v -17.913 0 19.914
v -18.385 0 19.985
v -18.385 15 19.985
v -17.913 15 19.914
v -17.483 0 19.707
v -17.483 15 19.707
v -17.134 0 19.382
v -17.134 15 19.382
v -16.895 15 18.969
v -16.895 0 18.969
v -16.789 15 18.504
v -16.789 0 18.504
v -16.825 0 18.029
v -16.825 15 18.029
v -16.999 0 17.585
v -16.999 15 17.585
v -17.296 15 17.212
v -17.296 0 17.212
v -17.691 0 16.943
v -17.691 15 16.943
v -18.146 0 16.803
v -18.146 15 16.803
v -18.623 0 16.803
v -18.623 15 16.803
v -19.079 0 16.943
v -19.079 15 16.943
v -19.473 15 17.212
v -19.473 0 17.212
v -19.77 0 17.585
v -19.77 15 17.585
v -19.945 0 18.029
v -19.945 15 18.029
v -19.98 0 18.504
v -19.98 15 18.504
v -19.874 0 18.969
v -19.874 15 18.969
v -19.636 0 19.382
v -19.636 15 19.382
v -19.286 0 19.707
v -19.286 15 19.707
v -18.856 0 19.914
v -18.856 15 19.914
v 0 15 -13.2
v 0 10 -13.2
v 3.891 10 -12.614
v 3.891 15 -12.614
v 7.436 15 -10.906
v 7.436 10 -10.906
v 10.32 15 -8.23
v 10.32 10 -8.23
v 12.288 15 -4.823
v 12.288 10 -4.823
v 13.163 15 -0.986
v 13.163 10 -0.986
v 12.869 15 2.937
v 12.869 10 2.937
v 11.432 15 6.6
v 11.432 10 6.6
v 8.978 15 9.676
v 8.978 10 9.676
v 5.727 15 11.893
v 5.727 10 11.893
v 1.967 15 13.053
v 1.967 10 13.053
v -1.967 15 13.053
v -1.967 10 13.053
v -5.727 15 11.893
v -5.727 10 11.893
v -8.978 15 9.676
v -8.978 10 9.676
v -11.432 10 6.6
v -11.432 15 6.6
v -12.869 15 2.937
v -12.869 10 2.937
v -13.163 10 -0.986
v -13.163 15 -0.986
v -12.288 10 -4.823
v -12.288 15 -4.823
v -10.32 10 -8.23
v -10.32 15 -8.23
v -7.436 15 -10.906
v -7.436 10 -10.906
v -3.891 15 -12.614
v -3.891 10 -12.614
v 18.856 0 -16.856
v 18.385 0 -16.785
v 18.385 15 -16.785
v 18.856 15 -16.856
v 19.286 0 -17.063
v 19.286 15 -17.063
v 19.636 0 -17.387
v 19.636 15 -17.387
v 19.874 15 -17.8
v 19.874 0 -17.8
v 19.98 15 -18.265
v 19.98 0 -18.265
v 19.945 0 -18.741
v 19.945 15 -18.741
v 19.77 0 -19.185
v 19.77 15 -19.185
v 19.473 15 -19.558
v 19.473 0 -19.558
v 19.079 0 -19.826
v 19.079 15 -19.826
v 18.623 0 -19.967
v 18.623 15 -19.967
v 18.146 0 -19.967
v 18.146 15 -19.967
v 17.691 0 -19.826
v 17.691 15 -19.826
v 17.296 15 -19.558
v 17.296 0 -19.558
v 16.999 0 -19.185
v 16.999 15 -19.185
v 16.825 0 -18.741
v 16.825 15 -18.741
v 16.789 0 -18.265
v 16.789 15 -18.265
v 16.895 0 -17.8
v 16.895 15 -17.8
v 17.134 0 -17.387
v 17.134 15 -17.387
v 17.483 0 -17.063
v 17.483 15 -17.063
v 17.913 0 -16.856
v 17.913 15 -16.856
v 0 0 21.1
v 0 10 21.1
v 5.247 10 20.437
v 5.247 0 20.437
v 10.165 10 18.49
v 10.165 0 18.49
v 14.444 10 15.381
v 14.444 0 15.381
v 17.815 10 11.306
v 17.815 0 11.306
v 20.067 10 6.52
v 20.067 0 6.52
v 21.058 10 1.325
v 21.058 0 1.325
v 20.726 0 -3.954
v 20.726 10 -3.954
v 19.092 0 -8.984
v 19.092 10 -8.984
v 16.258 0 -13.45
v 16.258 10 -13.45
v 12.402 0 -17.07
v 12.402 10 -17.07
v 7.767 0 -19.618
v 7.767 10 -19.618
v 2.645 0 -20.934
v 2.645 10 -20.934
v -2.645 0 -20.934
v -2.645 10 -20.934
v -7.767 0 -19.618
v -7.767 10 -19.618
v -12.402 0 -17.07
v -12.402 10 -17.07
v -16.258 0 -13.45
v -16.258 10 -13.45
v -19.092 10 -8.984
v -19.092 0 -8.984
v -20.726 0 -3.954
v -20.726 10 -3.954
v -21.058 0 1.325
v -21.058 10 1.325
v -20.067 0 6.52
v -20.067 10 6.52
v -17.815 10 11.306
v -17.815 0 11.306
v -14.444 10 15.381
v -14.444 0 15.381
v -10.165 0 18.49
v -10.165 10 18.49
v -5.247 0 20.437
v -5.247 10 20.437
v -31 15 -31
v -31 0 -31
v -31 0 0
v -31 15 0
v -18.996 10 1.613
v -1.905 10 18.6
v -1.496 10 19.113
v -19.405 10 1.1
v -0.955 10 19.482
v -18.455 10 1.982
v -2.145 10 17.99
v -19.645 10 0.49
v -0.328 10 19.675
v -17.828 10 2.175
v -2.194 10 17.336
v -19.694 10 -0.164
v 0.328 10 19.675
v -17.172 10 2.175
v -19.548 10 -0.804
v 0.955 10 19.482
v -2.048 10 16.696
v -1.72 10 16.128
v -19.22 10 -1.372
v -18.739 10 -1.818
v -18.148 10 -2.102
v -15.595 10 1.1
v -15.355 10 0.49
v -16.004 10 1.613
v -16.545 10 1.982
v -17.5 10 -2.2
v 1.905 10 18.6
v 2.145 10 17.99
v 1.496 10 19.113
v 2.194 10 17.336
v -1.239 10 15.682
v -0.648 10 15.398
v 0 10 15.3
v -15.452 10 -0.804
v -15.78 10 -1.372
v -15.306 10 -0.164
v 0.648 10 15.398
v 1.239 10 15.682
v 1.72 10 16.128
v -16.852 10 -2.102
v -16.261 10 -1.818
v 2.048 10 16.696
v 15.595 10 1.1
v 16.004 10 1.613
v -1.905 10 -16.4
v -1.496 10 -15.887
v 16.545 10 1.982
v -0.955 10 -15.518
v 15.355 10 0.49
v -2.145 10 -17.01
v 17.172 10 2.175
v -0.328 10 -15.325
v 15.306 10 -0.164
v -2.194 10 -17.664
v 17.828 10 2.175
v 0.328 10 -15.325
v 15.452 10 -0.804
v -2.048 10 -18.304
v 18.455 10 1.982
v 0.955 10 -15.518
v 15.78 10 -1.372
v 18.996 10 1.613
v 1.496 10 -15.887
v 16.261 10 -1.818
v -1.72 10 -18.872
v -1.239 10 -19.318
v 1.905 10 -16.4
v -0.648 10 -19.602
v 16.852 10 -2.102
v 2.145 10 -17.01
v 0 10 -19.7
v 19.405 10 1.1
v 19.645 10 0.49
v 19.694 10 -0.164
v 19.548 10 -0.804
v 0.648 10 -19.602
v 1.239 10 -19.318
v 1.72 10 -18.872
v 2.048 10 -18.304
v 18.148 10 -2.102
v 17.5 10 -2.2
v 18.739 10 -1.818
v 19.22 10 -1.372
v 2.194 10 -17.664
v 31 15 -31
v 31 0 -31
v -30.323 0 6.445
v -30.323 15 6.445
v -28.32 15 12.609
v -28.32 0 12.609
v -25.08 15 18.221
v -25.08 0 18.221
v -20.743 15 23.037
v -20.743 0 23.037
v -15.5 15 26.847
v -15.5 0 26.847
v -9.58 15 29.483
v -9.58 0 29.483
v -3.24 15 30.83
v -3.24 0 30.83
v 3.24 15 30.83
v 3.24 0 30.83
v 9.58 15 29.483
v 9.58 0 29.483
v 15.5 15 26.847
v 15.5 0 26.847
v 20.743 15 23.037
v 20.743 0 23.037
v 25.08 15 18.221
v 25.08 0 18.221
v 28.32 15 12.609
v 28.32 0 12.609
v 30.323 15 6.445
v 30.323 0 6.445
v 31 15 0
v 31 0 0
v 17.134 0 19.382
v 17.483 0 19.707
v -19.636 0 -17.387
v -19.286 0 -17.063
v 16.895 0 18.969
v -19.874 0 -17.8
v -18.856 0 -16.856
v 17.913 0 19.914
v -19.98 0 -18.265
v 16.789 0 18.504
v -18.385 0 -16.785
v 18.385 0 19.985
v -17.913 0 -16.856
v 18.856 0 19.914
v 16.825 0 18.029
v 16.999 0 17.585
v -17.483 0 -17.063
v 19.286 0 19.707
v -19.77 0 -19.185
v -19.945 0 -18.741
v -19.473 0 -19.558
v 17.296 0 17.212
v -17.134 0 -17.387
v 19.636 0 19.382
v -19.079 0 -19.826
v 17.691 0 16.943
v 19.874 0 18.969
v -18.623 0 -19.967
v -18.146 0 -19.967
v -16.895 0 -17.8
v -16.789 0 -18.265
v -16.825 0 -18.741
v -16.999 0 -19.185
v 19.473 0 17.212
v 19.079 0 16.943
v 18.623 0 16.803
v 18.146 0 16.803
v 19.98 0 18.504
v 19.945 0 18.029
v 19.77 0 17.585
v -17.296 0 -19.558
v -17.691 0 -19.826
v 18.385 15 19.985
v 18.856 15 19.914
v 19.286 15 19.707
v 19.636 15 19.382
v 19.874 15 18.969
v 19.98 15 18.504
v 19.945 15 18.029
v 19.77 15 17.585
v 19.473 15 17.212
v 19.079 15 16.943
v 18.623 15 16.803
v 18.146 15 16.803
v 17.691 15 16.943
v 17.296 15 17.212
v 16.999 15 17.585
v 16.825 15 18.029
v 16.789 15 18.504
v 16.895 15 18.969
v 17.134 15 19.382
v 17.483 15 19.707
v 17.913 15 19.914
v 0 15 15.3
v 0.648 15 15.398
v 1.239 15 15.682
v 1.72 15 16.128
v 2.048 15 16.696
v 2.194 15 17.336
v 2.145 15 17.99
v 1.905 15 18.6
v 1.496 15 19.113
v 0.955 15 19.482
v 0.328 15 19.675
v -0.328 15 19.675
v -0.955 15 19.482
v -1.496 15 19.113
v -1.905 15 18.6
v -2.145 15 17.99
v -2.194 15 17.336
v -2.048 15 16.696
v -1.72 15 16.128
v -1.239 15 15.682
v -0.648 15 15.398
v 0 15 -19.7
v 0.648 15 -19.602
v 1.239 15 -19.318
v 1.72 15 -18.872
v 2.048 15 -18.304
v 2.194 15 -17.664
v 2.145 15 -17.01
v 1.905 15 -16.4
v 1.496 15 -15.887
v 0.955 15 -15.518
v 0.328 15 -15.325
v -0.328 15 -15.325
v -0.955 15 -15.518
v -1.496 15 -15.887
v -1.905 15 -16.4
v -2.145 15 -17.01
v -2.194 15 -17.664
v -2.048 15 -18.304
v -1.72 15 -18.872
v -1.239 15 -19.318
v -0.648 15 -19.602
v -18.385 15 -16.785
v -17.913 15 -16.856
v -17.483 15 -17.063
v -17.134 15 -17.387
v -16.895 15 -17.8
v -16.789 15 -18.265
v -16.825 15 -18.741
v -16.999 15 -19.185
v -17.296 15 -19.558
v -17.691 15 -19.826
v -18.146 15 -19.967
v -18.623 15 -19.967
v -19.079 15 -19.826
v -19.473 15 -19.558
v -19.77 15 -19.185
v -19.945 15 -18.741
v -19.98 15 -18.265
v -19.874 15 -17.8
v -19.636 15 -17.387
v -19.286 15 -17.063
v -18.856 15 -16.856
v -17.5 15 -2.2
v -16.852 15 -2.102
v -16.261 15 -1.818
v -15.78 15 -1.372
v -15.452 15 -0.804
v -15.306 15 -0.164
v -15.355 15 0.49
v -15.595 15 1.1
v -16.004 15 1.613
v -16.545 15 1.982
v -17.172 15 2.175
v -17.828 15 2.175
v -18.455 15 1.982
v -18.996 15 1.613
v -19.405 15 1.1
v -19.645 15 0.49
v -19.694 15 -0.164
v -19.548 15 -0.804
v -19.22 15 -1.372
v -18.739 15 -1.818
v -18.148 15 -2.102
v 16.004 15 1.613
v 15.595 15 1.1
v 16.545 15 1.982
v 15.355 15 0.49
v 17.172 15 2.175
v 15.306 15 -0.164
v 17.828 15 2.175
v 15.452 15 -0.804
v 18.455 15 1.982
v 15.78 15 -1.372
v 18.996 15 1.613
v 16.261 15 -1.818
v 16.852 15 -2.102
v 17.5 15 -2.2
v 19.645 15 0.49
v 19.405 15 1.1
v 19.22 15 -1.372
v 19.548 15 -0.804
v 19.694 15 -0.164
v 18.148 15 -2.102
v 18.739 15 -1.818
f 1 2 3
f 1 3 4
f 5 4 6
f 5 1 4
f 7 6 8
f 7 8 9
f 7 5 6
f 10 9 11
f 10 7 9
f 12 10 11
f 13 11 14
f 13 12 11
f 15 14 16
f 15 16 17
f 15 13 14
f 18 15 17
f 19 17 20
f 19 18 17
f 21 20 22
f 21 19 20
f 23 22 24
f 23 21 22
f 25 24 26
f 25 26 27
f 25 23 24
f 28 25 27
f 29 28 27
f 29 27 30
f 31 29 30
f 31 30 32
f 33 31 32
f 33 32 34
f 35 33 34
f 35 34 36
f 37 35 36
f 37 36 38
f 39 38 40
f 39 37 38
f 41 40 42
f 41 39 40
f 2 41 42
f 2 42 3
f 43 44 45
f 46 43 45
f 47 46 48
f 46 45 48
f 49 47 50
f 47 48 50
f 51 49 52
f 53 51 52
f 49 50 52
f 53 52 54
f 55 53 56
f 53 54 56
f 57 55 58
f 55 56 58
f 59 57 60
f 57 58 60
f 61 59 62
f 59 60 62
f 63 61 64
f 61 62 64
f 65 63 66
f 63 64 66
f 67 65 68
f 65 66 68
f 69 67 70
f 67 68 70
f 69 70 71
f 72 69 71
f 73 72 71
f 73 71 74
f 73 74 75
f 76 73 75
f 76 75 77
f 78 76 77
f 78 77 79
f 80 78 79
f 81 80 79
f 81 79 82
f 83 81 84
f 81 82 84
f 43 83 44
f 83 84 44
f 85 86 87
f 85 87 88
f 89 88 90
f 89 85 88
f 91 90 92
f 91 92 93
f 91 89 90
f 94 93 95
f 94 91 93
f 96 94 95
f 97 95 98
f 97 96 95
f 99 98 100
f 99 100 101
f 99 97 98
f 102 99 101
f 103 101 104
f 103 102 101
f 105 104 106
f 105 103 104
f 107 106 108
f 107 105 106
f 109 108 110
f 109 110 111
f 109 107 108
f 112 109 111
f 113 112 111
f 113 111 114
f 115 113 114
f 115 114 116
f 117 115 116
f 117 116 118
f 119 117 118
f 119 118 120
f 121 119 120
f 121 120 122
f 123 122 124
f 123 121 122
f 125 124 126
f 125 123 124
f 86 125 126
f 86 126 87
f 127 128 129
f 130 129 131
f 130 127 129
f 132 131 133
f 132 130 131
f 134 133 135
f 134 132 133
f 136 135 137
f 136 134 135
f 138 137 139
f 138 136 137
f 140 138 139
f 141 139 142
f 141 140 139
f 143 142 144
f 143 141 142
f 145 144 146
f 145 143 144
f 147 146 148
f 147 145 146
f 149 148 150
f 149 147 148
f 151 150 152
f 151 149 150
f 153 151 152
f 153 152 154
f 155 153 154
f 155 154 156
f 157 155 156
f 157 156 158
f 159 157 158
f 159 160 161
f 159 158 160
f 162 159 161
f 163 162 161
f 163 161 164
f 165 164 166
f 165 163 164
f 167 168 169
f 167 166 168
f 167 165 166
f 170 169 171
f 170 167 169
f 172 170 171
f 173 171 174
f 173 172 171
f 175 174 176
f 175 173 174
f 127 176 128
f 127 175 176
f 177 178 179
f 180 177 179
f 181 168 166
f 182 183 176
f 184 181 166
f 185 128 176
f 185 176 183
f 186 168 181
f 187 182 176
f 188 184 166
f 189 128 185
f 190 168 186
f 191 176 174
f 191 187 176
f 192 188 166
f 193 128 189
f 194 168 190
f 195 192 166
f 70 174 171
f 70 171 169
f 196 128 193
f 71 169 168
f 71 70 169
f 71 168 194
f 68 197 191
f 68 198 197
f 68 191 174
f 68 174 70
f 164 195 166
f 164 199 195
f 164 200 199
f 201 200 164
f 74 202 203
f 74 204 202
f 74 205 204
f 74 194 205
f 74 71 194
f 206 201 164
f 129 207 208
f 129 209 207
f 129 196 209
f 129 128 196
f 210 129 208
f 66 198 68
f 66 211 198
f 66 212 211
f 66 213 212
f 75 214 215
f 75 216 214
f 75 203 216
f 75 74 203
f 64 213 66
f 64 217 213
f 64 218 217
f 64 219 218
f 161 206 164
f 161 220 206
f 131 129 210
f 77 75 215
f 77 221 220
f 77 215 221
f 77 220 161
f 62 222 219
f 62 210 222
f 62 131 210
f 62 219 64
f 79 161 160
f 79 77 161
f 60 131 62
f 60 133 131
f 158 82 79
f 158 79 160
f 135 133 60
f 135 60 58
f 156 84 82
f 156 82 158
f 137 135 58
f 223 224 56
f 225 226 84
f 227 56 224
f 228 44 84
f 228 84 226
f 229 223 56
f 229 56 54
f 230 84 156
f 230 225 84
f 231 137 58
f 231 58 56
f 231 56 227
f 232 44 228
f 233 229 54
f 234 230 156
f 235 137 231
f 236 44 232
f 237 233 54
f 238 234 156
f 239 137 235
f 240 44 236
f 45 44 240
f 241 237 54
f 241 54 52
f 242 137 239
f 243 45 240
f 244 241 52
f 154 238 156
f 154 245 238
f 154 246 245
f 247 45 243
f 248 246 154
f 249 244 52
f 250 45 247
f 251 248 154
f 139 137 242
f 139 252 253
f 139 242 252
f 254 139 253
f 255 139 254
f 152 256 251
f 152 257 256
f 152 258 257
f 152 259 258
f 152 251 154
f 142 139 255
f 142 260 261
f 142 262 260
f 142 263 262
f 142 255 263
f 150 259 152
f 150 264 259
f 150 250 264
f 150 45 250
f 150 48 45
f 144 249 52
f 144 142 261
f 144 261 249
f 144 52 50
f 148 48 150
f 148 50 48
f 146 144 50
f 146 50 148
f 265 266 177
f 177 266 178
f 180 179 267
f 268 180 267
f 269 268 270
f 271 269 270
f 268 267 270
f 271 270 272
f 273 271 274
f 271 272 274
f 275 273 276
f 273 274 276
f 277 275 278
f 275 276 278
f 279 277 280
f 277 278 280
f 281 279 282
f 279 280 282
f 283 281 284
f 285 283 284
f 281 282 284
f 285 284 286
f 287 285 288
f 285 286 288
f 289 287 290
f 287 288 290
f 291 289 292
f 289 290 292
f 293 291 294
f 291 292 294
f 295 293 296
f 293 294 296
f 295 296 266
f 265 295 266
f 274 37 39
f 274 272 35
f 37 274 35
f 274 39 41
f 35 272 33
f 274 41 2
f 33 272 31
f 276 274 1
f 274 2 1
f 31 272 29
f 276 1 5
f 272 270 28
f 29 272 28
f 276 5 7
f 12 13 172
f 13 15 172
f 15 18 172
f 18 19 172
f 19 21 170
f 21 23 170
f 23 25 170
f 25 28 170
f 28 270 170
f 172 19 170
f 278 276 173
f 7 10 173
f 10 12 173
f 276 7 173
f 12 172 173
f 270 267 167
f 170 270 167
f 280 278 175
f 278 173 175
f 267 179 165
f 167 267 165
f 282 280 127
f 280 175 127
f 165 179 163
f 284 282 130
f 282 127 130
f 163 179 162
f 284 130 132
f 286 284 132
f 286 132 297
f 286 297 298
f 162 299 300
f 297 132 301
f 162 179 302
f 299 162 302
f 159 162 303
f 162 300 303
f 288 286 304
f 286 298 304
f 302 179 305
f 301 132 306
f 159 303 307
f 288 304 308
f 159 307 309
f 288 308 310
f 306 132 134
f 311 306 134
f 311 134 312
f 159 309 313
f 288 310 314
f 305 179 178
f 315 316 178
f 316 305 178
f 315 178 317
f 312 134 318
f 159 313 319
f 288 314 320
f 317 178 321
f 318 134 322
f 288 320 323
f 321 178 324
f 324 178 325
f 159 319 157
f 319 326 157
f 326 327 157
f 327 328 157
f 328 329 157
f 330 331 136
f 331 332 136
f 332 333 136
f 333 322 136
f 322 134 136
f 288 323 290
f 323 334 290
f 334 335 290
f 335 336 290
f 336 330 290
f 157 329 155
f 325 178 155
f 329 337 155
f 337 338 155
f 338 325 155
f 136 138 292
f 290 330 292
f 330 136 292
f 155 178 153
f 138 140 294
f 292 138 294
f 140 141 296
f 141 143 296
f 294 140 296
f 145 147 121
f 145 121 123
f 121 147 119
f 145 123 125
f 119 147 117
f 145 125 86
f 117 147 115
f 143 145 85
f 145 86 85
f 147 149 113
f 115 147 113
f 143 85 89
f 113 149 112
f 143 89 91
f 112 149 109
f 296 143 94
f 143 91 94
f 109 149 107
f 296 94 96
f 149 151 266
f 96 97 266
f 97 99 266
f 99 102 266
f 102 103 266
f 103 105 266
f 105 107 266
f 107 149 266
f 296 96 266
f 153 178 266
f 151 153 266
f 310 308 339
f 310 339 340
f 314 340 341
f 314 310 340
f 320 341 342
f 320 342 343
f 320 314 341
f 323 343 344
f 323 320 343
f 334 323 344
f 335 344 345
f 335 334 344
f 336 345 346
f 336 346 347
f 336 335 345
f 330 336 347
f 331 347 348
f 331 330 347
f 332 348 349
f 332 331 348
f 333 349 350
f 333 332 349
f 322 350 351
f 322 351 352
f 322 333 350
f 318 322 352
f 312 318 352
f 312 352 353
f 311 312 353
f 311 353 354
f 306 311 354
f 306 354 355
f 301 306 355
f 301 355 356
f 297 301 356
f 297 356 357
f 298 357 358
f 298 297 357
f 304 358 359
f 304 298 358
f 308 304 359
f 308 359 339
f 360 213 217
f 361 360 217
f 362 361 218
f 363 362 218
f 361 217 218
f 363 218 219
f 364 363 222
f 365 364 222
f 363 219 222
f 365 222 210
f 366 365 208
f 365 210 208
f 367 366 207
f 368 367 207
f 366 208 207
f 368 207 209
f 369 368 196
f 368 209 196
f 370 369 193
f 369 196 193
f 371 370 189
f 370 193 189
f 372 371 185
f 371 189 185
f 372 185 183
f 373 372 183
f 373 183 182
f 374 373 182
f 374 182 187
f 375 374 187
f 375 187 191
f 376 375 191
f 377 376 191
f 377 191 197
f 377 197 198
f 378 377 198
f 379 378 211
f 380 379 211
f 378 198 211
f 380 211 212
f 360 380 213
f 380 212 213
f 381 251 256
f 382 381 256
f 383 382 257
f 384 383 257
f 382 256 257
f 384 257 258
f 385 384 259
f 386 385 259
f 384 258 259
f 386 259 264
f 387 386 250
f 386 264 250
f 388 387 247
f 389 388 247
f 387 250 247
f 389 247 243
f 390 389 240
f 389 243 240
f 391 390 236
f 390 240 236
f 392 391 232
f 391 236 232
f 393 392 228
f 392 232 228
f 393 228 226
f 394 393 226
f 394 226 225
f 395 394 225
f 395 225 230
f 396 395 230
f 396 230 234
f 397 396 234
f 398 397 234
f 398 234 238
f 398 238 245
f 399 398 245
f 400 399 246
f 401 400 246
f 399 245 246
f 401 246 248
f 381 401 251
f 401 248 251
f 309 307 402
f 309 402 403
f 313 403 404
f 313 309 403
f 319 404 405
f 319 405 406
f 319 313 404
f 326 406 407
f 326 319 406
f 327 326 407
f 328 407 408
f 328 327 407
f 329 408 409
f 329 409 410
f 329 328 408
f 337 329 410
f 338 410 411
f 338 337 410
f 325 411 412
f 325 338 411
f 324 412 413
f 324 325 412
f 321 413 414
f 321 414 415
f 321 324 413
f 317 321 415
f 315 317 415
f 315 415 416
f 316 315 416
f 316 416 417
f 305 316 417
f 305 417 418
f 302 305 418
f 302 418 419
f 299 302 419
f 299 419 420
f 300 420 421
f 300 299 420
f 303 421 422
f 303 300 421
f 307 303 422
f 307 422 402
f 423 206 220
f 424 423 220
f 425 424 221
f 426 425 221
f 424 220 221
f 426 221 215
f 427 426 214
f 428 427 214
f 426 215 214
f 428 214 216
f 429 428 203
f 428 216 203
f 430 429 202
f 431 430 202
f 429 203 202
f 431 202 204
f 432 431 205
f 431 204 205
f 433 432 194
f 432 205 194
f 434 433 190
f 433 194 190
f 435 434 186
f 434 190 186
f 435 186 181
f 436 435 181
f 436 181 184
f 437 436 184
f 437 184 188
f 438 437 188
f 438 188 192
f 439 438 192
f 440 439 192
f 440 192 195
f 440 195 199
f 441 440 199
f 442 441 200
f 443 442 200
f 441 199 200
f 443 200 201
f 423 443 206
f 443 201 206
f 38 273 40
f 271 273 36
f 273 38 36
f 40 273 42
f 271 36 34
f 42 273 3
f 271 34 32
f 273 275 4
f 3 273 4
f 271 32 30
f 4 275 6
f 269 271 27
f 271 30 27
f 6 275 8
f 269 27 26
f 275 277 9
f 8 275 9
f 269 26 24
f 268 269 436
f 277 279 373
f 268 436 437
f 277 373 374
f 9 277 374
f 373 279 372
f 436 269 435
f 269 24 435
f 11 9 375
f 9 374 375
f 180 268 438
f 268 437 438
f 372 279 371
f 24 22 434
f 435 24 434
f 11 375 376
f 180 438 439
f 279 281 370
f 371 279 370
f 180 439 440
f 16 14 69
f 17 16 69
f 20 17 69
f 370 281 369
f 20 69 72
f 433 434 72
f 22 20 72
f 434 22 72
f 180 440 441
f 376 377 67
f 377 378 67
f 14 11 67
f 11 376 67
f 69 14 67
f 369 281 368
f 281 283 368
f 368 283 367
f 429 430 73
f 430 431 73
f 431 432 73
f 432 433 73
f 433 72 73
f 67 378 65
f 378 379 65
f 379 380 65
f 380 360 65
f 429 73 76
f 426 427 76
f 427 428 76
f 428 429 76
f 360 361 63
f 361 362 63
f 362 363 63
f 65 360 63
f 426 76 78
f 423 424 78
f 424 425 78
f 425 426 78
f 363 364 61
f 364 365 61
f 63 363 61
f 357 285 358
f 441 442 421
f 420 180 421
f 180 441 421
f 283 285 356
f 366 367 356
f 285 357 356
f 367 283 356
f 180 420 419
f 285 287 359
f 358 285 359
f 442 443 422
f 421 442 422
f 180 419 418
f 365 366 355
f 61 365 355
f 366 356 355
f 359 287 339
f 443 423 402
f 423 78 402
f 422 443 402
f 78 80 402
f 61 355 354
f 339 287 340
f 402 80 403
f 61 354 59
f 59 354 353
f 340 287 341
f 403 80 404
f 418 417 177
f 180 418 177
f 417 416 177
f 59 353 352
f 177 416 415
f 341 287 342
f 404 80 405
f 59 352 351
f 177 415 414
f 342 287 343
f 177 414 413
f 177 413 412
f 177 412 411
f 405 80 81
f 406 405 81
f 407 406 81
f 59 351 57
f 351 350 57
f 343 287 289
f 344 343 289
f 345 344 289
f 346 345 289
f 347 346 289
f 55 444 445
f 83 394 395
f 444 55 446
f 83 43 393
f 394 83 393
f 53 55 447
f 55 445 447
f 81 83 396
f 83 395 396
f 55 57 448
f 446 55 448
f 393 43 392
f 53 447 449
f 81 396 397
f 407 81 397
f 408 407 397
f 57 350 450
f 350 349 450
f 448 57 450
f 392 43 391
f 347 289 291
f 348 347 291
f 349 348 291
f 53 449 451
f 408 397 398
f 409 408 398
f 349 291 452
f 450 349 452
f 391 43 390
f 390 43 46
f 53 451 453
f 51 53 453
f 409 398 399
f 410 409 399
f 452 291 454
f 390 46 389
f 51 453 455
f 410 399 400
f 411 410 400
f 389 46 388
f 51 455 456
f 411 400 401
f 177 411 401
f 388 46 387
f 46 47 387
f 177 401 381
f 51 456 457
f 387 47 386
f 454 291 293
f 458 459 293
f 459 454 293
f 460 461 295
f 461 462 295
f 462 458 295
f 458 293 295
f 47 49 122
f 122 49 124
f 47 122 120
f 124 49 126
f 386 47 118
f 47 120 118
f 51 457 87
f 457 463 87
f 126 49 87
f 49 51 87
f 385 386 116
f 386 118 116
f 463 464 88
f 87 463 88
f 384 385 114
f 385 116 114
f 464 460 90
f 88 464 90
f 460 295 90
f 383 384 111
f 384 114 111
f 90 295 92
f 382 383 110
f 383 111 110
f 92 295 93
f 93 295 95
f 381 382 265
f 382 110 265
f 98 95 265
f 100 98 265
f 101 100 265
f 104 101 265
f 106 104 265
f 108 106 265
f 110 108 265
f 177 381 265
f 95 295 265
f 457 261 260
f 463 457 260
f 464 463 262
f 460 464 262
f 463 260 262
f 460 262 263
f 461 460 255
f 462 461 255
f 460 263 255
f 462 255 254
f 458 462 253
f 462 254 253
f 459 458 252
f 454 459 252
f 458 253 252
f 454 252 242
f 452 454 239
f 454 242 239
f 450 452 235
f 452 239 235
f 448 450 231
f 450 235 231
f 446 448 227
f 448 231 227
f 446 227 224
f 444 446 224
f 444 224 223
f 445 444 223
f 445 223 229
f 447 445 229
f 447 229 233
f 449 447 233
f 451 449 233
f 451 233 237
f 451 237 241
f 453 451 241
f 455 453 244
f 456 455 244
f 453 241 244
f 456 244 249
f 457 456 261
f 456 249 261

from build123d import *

# Parameters (mm, degrees)
SKETCH_1_R      = 31
SKETCH_1_R_2    = 1.6
SKETCH_1_R_3    = 21.1
EXTRUDE_1_DEPTH = 15
EXTRUDE_START   = -10
SKETCH_2_R      = 21.1
SKETCH_2_R_2    = 13.2
SKETCH_2_R_3    = 2.2
EXTRUDE_2_DEPTH = 5


with BuildPart() as part:
    # 草图1 → 凸台-拉伸1 (new body)
    # profile 1 of 3: a face of its own
    with BuildSketch(Plane(origin=(0, 0, 0), x_dir=(1, 0, 0), z_dir=(0, 1, 0))):
        Circle(SKETCH_1_R)
        with Locations(Location((-18.384776311, 18.384776311, 0), (0, 0, 270))):
            Circle(SKETCH_1_R_2, mode=Mode.SUBTRACT)
        with Locations(Location((-18.384776311, -18.384776311, 0), (0, 0, 270))):
            Circle(SKETCH_1_R_2, mode=Mode.SUBTRACT)
        with Locations(Location((18.384776311, -18.384776311, 0), (0, 0, 270))):
            Circle(SKETCH_1_R_2, mode=Mode.SUBTRACT)
        with Locations(Location((18.384776311, 18.384776311, 0), (0, 0, 270))):
            Circle(SKETCH_1_R_2, mode=Mode.SUBTRACT)
        with Locations(Location((0, 0, 0), (0, 0, 270))):
            Circle(SKETCH_1_R_3, mode=Mode.SUBTRACT)
    # profile 2 of 3: a face of its own
    with BuildSketch(Plane(origin=(0, 0, 0), x_dir=(1, 0, 0), z_dir=(0, 1, 0))):
        with BuildLine():
            Line((-31, 31), (-31, 0))
            ThreePointArc((-31, 0), (-21.920310218, 21.920310215), (-4e-09, 31))
            Line((-4e-09, 31), (-31, 31))
        make_face()
    # profile 3 of 3: a face of its own
    with BuildSketch(Plane(origin=(0, 0, 0), x_dir=(1, 0, 0), z_dir=(0, 1, 0))):
        with BuildLine():
            ThreePointArc((-4e-09, 31), (21.920310215, 21.920310218), (31, 0))
            Line((31, 0), (31, 31))
            Line((31, 31), (-4e-09, 31))
        make_face()
    extrude(amount=EXTRUDE_1_DEPTH)

    # 草图2 → 凸台-拉伸2 (add)
    with BuildSketch(Plane.XZ.offset(EXTRUDE_START)):
        with Locations(Location((0, 0, 0), (0, 0, 270))):
            Circle(SKETCH_2_R)
        with Locations(Location((0, 0, 0), (0, 0, 270))):
            Circle(SKETCH_2_R_2, mode=Mode.SUBTRACT)
        with Locations(Location((0, 17.5, 0), (0, 0, 270))):
            Circle(SKETCH_2_R_3, mode=Mode.SUBTRACT)
        with Locations(Location((17.5, 0, 0), (0, 0, 270))):
            Circle(SKETCH_2_R_3, mode=Mode.SUBTRACT)
        with Locations(Location((0, -17.5, 0), (0, 0, 270))):
            Circle(SKETCH_2_R_3, mode=Mode.SUBTRACT)
        with Locations(Location((-17.5, 0, 0), (0, 0, 270))):
            Circle(SKETCH_2_R_3, mode=Mode.SUBTRACT)
    extrude(amount=-EXTRUDE_2_DEPTH)


solid = part.part
